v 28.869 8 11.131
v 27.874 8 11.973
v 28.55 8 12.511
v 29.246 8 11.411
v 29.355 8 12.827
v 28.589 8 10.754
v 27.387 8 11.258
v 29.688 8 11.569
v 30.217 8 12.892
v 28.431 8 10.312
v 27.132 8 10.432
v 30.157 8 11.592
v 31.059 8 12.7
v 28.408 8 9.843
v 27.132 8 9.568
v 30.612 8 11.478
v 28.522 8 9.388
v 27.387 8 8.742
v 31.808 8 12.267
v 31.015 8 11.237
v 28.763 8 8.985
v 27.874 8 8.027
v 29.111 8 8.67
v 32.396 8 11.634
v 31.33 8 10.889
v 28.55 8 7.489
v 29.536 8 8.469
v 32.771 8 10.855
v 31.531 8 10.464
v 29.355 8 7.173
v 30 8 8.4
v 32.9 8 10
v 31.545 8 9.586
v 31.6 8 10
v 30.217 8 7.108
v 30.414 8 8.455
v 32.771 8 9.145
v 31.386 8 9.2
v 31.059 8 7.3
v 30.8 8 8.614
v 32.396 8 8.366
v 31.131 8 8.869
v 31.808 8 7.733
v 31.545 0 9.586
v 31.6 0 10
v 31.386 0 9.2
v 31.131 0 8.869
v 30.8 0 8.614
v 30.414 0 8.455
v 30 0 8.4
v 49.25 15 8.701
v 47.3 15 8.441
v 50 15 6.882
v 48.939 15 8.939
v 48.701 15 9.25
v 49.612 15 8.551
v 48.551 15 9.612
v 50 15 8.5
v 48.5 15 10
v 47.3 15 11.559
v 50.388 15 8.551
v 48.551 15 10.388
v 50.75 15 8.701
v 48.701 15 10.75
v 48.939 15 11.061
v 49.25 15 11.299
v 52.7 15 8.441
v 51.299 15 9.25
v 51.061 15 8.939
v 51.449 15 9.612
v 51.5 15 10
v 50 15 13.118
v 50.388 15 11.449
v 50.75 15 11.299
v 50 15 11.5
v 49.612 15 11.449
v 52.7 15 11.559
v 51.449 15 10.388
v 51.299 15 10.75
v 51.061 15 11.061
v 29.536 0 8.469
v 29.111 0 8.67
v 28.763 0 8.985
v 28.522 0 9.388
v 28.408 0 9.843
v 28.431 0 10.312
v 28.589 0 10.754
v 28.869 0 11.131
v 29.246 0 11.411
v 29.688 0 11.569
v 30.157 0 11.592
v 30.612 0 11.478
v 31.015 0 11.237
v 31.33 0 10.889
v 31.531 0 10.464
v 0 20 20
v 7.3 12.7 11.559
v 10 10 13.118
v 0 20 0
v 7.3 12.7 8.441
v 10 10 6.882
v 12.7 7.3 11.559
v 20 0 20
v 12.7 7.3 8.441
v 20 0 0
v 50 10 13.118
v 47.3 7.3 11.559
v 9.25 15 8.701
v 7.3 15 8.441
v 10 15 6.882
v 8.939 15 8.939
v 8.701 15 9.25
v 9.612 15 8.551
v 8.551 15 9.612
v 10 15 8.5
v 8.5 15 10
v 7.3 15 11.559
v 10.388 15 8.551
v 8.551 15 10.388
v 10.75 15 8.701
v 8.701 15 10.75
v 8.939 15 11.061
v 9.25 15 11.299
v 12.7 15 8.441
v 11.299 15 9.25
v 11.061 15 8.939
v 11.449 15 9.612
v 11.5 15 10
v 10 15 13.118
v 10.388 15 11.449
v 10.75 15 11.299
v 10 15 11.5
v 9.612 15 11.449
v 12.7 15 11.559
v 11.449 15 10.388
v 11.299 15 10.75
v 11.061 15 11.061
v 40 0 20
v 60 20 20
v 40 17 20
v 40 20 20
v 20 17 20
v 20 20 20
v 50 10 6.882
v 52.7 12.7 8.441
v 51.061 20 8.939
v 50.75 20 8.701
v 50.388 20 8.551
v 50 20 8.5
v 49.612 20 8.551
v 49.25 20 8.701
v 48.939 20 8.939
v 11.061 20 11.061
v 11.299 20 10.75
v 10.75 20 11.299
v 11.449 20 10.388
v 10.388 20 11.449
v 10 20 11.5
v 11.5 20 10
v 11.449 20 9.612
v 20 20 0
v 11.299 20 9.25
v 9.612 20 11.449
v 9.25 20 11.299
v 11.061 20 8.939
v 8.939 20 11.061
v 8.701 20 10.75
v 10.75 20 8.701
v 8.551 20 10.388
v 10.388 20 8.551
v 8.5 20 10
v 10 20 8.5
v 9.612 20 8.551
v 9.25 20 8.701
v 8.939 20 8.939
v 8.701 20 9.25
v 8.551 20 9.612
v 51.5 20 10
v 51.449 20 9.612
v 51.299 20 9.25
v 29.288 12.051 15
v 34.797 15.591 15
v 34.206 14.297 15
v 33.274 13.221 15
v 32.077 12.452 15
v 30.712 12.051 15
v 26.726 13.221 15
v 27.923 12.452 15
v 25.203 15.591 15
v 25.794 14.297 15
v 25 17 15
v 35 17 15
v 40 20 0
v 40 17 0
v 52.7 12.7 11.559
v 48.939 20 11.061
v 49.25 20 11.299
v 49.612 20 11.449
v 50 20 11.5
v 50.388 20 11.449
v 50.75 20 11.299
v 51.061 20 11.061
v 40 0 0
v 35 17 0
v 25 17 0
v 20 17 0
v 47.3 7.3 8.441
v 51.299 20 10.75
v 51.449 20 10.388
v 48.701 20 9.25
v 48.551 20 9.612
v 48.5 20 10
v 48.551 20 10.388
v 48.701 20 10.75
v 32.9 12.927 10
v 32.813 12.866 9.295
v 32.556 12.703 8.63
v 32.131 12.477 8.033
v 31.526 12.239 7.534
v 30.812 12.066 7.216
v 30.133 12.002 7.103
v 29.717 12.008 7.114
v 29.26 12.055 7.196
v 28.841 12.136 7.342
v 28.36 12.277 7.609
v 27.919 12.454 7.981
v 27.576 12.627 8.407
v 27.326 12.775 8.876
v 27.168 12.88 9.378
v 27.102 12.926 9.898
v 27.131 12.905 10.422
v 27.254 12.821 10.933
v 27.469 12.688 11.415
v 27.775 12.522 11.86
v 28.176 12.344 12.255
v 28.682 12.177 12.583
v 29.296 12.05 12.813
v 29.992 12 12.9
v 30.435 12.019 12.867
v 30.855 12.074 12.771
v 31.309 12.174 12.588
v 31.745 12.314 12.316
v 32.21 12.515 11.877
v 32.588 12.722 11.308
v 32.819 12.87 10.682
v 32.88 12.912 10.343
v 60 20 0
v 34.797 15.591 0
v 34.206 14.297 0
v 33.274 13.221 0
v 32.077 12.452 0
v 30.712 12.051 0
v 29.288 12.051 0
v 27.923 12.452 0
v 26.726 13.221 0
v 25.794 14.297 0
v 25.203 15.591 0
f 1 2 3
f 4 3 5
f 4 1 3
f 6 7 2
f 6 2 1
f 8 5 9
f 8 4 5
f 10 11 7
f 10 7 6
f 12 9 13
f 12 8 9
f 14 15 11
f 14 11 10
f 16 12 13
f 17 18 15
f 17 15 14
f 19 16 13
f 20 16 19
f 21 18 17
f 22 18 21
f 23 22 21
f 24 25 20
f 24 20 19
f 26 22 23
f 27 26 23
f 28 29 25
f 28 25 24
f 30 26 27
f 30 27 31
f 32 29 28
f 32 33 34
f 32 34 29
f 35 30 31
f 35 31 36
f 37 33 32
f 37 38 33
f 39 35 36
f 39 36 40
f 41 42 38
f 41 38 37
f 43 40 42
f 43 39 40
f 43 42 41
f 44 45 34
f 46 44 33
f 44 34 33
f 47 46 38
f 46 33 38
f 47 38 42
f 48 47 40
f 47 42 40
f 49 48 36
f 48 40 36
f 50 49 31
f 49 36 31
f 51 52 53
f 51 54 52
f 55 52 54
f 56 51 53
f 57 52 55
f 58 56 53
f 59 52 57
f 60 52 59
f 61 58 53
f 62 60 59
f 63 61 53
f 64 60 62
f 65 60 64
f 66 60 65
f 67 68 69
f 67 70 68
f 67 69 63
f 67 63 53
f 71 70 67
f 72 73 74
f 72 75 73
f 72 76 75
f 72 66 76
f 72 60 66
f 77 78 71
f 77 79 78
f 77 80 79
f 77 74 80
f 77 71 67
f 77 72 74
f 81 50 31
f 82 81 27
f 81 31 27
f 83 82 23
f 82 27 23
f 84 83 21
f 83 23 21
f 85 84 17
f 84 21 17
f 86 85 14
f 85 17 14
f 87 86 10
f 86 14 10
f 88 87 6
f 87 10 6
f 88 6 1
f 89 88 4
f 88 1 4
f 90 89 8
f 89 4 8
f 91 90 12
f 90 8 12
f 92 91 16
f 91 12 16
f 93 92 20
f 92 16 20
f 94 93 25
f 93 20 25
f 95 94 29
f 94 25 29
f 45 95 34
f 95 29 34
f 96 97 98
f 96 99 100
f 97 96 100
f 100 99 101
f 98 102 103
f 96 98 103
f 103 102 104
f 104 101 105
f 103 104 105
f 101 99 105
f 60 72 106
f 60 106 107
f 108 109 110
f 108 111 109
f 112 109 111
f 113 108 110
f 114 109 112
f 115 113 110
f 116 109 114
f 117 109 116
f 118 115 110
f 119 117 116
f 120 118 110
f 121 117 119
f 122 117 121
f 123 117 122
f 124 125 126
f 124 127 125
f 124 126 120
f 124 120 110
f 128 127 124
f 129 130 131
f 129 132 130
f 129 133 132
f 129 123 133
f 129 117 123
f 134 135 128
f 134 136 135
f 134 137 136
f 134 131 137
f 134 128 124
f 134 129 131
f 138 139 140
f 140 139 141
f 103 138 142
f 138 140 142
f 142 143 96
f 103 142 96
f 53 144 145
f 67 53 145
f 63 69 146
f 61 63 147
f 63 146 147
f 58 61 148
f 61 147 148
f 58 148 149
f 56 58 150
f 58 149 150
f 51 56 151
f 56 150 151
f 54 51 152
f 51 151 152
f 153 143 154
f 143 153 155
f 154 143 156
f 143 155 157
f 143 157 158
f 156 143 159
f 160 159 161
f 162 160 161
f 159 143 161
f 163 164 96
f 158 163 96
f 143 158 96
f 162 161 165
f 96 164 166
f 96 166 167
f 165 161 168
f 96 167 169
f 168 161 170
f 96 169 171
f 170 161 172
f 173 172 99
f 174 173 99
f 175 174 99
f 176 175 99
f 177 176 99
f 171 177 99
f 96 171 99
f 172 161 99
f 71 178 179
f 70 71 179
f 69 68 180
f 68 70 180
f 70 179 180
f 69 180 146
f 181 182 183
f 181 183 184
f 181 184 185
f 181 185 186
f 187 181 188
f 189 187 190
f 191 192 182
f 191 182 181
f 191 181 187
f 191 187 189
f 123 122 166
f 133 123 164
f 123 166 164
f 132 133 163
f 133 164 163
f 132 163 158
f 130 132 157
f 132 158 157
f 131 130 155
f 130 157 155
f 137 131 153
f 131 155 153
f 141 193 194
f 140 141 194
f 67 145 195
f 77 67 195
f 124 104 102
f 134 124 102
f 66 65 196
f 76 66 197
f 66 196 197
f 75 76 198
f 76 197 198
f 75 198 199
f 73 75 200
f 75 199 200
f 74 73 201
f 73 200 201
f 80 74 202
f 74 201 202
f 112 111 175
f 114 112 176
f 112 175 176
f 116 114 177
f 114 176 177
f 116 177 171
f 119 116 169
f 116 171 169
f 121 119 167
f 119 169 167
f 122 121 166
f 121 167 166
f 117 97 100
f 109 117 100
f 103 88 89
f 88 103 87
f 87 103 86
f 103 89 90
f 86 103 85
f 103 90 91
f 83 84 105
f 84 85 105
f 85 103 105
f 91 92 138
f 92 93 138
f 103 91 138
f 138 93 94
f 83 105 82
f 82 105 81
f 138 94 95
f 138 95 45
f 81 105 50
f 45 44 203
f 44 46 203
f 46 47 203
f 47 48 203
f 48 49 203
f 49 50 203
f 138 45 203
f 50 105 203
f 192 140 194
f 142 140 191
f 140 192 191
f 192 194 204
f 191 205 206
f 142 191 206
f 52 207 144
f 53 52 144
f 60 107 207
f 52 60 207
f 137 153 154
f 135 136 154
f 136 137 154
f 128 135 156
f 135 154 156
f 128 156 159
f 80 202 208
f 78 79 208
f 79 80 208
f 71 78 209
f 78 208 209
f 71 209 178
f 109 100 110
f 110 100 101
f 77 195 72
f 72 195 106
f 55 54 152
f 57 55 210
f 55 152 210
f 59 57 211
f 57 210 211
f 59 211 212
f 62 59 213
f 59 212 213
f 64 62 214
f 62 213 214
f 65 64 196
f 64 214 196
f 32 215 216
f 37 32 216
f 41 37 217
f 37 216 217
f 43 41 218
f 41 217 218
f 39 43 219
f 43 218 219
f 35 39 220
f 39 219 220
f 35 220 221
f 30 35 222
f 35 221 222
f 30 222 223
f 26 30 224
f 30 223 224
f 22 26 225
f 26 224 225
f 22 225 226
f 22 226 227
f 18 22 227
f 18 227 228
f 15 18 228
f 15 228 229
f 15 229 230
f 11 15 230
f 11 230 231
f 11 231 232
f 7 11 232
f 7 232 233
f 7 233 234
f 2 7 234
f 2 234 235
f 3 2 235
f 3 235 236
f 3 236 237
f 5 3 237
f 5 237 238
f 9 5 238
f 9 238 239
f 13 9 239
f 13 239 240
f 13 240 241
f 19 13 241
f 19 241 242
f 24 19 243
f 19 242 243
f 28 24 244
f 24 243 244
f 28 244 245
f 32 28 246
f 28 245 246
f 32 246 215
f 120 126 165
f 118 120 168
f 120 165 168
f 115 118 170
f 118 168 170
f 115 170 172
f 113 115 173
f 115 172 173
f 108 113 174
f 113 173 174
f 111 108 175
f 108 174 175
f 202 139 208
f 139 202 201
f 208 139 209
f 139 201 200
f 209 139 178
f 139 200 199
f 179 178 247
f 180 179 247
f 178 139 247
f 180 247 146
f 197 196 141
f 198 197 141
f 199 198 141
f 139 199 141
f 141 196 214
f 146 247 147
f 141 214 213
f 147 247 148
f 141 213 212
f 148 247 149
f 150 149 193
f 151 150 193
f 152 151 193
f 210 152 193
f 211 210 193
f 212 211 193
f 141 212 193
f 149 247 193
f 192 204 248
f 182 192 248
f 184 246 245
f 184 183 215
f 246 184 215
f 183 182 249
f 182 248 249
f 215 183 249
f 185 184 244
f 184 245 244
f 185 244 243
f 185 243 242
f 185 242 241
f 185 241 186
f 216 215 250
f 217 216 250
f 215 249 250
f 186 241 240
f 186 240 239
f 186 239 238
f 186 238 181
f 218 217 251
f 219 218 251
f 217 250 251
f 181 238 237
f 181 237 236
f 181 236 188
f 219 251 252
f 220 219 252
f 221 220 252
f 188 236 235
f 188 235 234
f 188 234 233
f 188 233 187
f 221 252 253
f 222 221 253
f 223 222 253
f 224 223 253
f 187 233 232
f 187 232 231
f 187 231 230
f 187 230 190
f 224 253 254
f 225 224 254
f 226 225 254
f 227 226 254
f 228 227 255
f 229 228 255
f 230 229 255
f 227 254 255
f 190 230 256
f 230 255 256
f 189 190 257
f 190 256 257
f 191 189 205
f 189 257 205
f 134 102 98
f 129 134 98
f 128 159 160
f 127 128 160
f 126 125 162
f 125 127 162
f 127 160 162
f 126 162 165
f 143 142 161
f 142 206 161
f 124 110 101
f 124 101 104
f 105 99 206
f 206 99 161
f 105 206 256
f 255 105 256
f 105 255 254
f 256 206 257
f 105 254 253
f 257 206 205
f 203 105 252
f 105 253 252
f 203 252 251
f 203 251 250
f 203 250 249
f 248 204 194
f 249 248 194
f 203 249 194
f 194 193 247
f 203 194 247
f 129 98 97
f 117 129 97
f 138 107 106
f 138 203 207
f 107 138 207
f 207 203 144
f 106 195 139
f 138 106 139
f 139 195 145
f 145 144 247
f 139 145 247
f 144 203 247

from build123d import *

# Parameters (mm, degrees)
BOSS_EXTRU_1_DEPTH      = 15
BOSS_EXTRU_2_DEPTH      = 5
ENL_V_MAT_EXTRU_1_DEPTH = 20
ESQUISSE4_R             = 2.9
ESQUISSE4_R_2           = 1.6
ENL_V_MAT_EXTRU_2_DEPTH = 12
ENL_V_MAT_EXTRU_3_DEPTH = 12
ESQUISSE7_R             = 1.5
ENL_V_MAT_EXTRU_5_DEPTH = 15


with BuildPart() as part:
    # Esquisse1 → Boss.-Extru.1 (new body)
    with BuildSketch(Plane.XY):
        Polygon((0, 20), (20, 0), (20, 20), align=None)
        with BuildLine():
            Line((20, 17), (20, 0))
            Line((20, 0), (40, 0))
            Line((40, 0), (40, 17))
            Line((40, 17), (35, 17))
            ThreePointArc((35, 17), (30, 12), (25, 17))
            Line((25, 17), (20, 17))
        make_face()
        Polygon((40, 0), (40, 20), (60, 20), align=None)
    extrude(amount=BOSS_EXTRU_1_DEPTH)

    # Esquisse3 → Boss.-Extru.2 (add)
    with BuildSketch(Plane.XY.offset(15)):
        with BuildLine():
            Line((25, 17), (35, 17))
            ThreePointArc((35, 17), (30, 12), (25, 17))
        make_face()
        with BuildLine():
            Line((20, 20), (0, 20))
            Line((0, 20), (20, 0))
            Line((20, 0), (40, 0))
            Line((40, 0), (60, 20))
            Line((60, 20), (40, 20))
            Line((40, 20), (40, 17))
            Line((40, 17), (35, 17))
            ThreePointArc((35, 17), (30, 12), (25, 17))
            Line((25, 17), (20, 17))
            Line((20, 17), (20, 20))
        make_face()
    extrude(amount=BOSS_EXTRU_2_DEPTH)

    # Esquisse2 → Enlèv. mat.-Extru.1 (cut)
    with BuildSketch(Plane(origin=(0, 20, 0), x_dir=(1, 0, 0), z_dir=(0, 1, 0))):
        with BuildLine():
            ThreePointArc((31.6, -10), (31.13137085, -8.86862915), (30, -8.4))
            Line((30, -8.4), (30, -10))
            Line((30, -10), (31.6, -10))
        make_face()
        with BuildLine():
            Line((30, -10), (30, -8.4))
            ThreePointArc((30, -8.4), (28.86862915, -11.13137085), (31.6, -10))
            Line((31.6, -10), (30, -10))
        make_face()
    extrude(amount=-ENL_V_MAT_EXTRU_1_DEPTH, mode=Mode.SUBTRACT)

    # Esquisse4 → Enlèv. mat.-Extru.2 (cut)
    with BuildSketch(Plane(origin=(0, 20, 0), x_dir=(1, 0, 0), z_dir=(0, 1, 0))):
        with Locations((30, -10)):
            Circle(ESQUISSE4_R)
        with Locations((30, -10)):
            Circle(ESQUISSE4_R_2, mode=Mode.SUBTRACT)
    extrude(amount=-ENL_V_MAT_EXTRU_2_DEPTH, mode=Mode.SUBTRACT)

    # Esquisse5 → Enlèv. mat.-Extru.3 (cut)
    with BuildSketch(Plane(origin=(0, 20, 0), x_dir=(1, 0, 0), z_dir=(0, 1, 0))):
        with BuildLine():
            ThreePointArc((51.5, -10), (51.385819299, -9.425974851), (51.060660172, -8.939339828))
            Line((51.060660172, -8.939339828), (50, -10))
            Line((50, -10), (51.060660172, -11.060660172))
            ThreePointArc((51.060660172, -11.060660172), (51.385819299, -10.574025149), (51.5, -10))
        make_face()
        with BuildLine():
            Line((50, -10), (51.060660172, -8.939339828))
            ThreePointArc((51.060660172, -8.939339828), (50, -8.5), (48.939339828, -8.939339828))
            Line((48.939339828, -8.939339828), (50, -10))
        make_face()
        with BuildLine():
            Line((50, -10), (48.939339828, -8.939339828))
            ThreePointArc((48.939339828, -8.939339828), (48.5, -10), (48.939339828, -11.060660172))
            Line((48.939339828, -11.060660172), (50, -10))
        make_face()
        with BuildLine():
            ThreePointArc((48.939339828, -11.060660172), (50, -11.5), (51.060660172, -11.060660172))
            Line((51.060660172, -11.060660172), (50, -10))
            Line((50, -10), (48.939339828, -11.060660172))
        make_face()
        with BuildLine():
            ThreePointArc((11.5, -10), (11.385819299, -9.425974851), (11.060660172, -8.939339828))
            Line((11.060660172, -8.939339828), (10, -10))
            Line((10, -10), (11.060660172, -11.060660172))
            ThreePointArc((11.060660172, -11.060660172), (11.385819299, -10.574025149), (11.5, -10))
        make_face()
        with BuildLine():
            Line((10, -10), (11.060660172, -8.939339828))
            ThreePointArc((11.060660172, -8.939339828), (10, -8.5), (8.939339828, -8.939339828))
            Line((8.939339828, -8.939339828), (10, -10))
        make_face()
        with BuildLine():
            Line((10, -10), (8.939339828, -8.939339828))
            ThreePointArc((8.939339828, -8.939339828), (8.5, -10), (8.939339828, -11.060660172))
            Line((8.939339828, -11.060660172), (10, -10))
        make_face()
        with BuildLine():
            ThreePointArc((8.939339828, -11.060660172), (10, -11.5), (11.060660172, -11.060660172))
            Line((11.060660172, -11.060660172), (10, -10))
            Line((10, -10), (8.939339828, -11.060660172))
        make_face()
    extrude(amount=-ENL_V_MAT_EXTRU_3_DEPTH, mode=Mode.SUBTRACT)

    # Esquisse7 → Enlèv. mat.-Extru.5 (cut)
    with BuildSketch(Plane.XZ):
        Polygon((10, 6.882308546), (12.7, 8.441154273), (12.7, 11.558845727), (10, 13.117691454), (7.3, 11.558845727), (7.3, 8.441154273), align=None)
        with Locations((10, 10)):
            Circle(ESQUISSE7_R, mode=Mode.SUBTRACT)
        Polygon((50, 6.882308546), (52.7, 8.441154273), (52.7, 11.558845727), (50, 13.117691454), (47.3, 11.558845727), (47.3, 8.441154273), align=None)
        with Locations((50, 10)):
            Circle(ESQUISSE7_R, mode=Mode.SUBTRACT)
    extrude(amount=-ENL_V_MAT_EXTRU_5_DEPTH, mode=Mode.SUBTRACT)


solid = part.part
